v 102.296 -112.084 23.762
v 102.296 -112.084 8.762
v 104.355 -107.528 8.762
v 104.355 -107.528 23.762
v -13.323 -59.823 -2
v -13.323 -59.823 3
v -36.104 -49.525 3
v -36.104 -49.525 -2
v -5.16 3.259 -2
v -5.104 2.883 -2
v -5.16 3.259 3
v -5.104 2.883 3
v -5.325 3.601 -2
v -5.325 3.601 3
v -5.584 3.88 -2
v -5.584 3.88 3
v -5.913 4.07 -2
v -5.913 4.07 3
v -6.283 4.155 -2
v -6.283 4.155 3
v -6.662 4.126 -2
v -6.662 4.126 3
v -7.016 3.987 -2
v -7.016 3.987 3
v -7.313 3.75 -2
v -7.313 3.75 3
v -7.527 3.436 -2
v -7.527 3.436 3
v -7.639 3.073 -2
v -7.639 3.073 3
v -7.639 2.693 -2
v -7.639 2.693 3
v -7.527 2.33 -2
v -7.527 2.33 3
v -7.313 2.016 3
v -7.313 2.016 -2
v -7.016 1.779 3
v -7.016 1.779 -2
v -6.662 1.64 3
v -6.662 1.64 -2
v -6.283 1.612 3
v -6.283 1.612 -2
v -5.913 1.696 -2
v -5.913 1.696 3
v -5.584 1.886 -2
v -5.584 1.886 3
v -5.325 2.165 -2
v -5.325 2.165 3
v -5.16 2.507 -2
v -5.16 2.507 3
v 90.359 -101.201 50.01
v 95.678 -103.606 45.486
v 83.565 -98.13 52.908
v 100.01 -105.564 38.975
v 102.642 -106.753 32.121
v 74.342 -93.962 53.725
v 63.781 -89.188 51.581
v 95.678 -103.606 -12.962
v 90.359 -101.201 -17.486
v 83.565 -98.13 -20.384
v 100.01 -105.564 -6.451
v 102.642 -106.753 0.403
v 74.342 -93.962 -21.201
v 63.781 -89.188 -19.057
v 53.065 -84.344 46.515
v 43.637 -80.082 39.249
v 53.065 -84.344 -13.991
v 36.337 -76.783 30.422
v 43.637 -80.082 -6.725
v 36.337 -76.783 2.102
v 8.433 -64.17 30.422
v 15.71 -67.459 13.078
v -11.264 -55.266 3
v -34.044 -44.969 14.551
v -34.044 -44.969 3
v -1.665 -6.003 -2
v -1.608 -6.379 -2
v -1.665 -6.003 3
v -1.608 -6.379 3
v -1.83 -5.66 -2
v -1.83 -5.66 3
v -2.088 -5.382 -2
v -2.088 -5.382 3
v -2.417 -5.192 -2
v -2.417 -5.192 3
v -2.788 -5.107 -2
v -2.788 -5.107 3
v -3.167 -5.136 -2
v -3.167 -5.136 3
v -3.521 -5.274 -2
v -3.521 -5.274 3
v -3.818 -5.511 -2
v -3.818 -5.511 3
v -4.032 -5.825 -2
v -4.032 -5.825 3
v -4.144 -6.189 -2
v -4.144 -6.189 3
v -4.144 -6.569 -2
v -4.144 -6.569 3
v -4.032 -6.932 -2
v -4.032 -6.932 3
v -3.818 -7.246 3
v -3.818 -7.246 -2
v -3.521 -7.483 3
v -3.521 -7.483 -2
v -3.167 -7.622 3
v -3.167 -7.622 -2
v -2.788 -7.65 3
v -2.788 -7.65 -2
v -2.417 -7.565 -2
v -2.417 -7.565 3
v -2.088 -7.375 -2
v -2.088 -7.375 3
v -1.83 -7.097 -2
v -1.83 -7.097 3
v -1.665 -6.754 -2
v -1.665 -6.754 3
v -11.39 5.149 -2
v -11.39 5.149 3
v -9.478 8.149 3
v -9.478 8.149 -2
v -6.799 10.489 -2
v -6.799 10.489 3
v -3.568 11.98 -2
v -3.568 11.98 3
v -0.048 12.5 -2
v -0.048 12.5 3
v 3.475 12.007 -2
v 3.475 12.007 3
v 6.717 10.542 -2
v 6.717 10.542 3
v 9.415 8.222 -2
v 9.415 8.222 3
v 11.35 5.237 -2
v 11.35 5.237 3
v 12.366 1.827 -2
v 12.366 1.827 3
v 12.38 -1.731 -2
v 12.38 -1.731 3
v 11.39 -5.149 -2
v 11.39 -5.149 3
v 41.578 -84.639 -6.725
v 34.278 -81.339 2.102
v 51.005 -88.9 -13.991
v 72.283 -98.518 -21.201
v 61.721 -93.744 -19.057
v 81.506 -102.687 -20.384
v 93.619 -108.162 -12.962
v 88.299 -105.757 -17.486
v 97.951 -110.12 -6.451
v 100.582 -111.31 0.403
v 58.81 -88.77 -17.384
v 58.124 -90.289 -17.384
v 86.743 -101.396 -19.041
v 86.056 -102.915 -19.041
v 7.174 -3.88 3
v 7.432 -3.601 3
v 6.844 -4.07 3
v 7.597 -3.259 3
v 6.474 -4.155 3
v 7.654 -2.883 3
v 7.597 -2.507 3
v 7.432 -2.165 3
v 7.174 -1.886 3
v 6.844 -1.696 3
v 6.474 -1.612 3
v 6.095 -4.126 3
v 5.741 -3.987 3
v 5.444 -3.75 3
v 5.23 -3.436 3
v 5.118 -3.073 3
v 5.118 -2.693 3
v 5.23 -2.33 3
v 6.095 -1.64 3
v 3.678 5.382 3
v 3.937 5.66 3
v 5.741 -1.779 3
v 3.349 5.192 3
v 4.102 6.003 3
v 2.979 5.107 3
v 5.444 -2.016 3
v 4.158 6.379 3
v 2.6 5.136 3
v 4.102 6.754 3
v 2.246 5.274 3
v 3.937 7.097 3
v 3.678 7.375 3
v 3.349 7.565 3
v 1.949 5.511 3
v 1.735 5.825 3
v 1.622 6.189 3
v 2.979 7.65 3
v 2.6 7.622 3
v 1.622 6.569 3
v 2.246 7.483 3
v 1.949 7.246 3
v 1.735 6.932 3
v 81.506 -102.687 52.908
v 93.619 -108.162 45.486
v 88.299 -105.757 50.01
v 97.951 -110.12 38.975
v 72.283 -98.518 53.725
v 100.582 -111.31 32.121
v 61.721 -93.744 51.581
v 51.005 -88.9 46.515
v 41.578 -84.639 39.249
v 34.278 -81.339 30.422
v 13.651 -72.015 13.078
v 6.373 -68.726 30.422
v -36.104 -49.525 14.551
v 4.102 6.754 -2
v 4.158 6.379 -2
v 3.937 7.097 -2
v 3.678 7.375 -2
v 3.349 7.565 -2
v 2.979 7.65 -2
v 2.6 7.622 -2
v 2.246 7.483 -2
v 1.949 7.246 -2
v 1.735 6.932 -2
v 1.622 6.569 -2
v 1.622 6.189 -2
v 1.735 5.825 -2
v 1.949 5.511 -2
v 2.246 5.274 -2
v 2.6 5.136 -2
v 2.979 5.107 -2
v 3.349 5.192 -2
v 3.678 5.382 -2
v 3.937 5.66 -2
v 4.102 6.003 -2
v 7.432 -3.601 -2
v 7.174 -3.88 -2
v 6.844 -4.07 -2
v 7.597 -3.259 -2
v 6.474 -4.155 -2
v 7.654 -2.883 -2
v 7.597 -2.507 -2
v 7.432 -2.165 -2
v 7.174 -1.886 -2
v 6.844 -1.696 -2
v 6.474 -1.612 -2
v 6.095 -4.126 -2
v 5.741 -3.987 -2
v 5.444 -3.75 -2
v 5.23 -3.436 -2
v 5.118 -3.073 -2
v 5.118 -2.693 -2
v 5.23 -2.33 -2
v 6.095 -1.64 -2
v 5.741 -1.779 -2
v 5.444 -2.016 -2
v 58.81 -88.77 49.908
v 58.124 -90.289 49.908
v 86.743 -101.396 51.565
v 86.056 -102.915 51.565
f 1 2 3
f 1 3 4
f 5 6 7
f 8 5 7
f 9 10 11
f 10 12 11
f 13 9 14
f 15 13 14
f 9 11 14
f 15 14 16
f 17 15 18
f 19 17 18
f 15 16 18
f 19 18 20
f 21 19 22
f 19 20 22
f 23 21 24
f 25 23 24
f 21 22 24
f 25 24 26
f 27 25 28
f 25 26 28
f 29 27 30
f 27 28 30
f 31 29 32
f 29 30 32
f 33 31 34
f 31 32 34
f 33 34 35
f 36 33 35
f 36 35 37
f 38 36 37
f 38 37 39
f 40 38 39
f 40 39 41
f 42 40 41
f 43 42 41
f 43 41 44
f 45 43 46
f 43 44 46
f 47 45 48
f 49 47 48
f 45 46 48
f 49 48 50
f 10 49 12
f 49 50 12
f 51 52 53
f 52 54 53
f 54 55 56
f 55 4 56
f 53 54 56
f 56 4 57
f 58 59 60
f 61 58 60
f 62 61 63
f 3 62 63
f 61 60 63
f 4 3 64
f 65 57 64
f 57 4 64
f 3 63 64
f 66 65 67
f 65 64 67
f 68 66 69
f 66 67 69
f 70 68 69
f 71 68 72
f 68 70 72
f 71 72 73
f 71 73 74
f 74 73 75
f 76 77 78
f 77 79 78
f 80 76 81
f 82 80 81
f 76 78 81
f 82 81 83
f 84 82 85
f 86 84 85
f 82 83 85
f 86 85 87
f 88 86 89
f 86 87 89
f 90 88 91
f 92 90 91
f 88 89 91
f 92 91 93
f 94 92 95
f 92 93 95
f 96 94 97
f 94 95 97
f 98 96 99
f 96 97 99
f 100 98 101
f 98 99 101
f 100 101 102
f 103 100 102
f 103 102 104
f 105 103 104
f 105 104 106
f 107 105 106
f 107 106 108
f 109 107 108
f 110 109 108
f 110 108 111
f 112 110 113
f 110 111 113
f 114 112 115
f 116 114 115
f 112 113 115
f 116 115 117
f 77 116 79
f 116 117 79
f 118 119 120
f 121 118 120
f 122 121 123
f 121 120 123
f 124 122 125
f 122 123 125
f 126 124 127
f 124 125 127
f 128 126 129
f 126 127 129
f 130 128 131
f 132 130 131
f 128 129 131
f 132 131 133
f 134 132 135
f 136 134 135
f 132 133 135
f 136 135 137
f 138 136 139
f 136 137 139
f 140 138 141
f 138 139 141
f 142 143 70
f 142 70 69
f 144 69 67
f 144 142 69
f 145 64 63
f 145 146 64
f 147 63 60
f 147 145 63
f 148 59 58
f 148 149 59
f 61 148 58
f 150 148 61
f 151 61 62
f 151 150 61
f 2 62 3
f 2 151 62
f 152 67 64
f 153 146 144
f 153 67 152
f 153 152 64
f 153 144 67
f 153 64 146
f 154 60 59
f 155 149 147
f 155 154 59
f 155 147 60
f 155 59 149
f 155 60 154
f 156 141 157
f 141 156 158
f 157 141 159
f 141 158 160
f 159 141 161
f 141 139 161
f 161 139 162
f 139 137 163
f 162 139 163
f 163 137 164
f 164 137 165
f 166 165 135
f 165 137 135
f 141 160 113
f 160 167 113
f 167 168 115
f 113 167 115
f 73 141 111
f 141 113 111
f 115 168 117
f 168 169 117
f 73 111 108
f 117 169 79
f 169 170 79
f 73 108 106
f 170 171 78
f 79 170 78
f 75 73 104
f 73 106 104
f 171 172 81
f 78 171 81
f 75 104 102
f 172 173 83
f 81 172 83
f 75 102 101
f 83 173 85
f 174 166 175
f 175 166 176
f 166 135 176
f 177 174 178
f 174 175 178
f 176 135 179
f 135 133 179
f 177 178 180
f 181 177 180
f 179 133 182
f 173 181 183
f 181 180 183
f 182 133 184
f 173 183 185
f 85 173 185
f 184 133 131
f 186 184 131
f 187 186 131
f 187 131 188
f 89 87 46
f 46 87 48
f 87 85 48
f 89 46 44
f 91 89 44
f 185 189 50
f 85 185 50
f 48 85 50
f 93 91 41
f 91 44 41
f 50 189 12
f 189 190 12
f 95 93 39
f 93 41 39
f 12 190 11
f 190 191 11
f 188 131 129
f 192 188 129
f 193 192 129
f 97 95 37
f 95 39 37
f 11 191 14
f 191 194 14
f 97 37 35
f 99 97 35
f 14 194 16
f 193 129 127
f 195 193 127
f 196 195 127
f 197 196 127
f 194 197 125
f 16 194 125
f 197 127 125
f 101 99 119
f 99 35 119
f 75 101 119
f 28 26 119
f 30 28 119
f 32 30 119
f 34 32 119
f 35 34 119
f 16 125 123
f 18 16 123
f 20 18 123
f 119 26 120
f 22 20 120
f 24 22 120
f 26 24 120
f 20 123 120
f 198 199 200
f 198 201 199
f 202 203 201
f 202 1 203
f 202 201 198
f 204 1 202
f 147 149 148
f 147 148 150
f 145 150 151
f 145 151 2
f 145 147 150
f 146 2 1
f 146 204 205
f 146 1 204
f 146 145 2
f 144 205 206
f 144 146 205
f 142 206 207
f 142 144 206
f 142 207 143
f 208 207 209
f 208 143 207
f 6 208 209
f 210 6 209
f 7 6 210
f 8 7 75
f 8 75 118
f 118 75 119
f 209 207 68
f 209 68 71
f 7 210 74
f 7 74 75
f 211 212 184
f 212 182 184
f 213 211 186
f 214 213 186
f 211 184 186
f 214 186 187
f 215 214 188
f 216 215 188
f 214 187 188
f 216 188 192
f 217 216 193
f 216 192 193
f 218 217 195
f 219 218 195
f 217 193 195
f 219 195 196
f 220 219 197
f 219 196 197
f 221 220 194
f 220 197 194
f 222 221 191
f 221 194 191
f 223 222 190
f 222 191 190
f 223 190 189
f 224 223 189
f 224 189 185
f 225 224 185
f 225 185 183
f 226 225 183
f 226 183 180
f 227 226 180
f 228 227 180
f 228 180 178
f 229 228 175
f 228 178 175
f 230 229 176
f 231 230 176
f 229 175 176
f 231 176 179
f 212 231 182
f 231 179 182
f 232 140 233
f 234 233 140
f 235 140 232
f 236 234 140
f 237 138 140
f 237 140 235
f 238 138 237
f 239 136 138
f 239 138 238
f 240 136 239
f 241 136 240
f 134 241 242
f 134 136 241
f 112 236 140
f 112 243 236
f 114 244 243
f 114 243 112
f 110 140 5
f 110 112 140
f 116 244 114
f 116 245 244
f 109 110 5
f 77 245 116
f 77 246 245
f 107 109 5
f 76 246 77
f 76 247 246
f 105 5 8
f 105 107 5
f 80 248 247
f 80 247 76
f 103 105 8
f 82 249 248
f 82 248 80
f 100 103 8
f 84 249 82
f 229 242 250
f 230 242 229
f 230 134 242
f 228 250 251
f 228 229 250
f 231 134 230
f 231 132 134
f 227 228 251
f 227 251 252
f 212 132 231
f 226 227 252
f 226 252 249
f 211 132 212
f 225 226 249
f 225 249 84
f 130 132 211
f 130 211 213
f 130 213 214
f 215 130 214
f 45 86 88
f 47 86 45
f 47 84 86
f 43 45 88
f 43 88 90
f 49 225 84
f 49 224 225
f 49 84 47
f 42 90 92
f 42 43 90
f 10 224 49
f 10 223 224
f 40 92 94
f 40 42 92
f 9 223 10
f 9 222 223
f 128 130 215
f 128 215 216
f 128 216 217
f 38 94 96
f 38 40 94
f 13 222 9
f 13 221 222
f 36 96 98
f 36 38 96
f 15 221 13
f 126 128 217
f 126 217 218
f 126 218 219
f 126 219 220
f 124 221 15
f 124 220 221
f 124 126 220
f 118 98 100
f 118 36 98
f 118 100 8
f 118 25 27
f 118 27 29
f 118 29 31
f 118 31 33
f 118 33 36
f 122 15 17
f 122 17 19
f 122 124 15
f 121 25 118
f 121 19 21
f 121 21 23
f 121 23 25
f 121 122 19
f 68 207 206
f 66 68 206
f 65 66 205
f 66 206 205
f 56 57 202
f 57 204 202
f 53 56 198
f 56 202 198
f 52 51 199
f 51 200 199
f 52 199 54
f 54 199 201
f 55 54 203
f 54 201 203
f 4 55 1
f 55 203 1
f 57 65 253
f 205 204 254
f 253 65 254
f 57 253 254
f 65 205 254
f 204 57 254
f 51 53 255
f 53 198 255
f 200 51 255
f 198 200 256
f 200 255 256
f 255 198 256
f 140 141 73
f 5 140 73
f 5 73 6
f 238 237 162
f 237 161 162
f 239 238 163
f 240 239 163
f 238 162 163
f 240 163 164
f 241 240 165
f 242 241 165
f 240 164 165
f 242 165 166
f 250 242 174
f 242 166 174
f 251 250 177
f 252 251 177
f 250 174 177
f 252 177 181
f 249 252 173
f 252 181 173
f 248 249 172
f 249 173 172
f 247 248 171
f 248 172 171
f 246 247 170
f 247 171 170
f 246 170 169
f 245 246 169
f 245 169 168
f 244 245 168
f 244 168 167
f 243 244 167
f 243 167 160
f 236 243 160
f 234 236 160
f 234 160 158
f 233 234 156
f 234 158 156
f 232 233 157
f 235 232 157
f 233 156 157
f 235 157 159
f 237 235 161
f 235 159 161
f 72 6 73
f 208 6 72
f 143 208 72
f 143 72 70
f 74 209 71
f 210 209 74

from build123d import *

# Parameters (mm, degrees)
SKETCH2_R           = 10
SKETCH2_R_2         = 1.275
BOSS_EXTRUDE1_DEPTH = 3
SKETCH3_R           = 1.275
BOSS_EXTRUDE2_DEPTH = 5
BOSS_EXTRUDE3_DEPTH = 5


with BuildPart() as part:
    # Sketch2 → Boss-Extrude1 (new body)
    with BuildSketch(Plane.XY):
        Circle(SKETCH2_R)
        with Locations((2.883236265, 6.378632192)):
            Circle(SKETCH2_R_2, mode=Mode.SUBTRACT)
        with Locations((6.378632192, -2.883236265)):
            Circle(SKETCH2_R_2, mode=Mode.SUBTRACT)
        with Locations((-2.883236265, -6.378632192)):
            Circle(SKETCH2_R_2, mode=Mode.SUBTRACT)
        with Locations((-6.378632192, 2.883236265)):
            Circle(SKETCH2_R_2, mode=Mode.SUBTRACT)
    extrude(amount=BOSS_EXTRUDE1_DEPTH)

    # Sketch3 → Boss-Extrude2 (add)
    with BuildSketch(Plane.XY.offset(3)):
        with BuildLine():
            Line((11.390414628, -5.148636188), (-13.323039072, -59.822626404))
            Line((-13.323039072, -59.822626404), (-36.103868329, -49.525354029))
            Line((-36.103868329, -49.525354029), (-11.390414628, 5.148636188))
            ThreePointArc((-11.390414628, 5.148636188), (5.148636188, 11.390414628), (11.390414628, -5.148636188))
        make_face()
        with Locations((2.883236265, 6.378632192)):
            Circle(SKETCH3_R, mode=Mode.SUBTRACT)
        with Locations((6.378632192, -2.883236265)):
            Circle(SKETCH3_R, mode=Mode.SUBTRACT)
        with Locations((-2.883236265, -6.378632192)):
            Circle(SKETCH3_R, mode=Mode.SUBTRACT)
        with Locations((-6.378632192, 2.883236265)):
            Circle(SKETCH3_R, mode=Mode.SUBTRACT)
    extrude(amount=-BOSS_EXTRUDE2_DEPTH)

    # Sketch4 → Boss-Extrude3 (add)
    with BuildSketch(Plane(origin=(-24.7134537, -54.673990217, 0), x_dir=(-0.91123317, 0.411890895, 0), z_dir=(-0.411890895, -0.91123317, 0))):
        with BuildLine():
            Line((-64.737964533, -30.42203086), (-34.115083994, -30.42203086))
            Line((-34.115083994, -30.42203086), (12.5, -14.551275179))
            Line((12.5, -14.551275179), (12.5, -3))
            Line((12.5, -3), (-12.5, -3))
            Line((-12.5, -3), (-42.101583528, -13.07827209))
            Line((-42.101583528, -13.07827209), (-64.737964533, -2.10203086))
            add(Edge.make_bspline(
                [(-64.737964533, -2.10203086), (-81.761805894, 22.419892021), (-132.619227666, 37.649465731), (-139.381607577, -8.76203086)],
                knots=[0, 0, 0, 0, 1, 1, 1, 1], degree=3))
            Line((-139.381607577, -8.76203086), (-139.381607577, -23.76203086))
            add(Edge.make_bspline(
                [(-64.737964533, -30.42203086), (-81.761805894, -54.943953742), (-132.619227666, -70.173527452), (-139.381607577, -23.76203086)],
                knots=[0, 0, 0, 0, 1, 1, 1, 1], degree=3))
        make_face()
    extrude(amount=-BOSS_EXTRUDE3_DEPTH)


solid = part.part
